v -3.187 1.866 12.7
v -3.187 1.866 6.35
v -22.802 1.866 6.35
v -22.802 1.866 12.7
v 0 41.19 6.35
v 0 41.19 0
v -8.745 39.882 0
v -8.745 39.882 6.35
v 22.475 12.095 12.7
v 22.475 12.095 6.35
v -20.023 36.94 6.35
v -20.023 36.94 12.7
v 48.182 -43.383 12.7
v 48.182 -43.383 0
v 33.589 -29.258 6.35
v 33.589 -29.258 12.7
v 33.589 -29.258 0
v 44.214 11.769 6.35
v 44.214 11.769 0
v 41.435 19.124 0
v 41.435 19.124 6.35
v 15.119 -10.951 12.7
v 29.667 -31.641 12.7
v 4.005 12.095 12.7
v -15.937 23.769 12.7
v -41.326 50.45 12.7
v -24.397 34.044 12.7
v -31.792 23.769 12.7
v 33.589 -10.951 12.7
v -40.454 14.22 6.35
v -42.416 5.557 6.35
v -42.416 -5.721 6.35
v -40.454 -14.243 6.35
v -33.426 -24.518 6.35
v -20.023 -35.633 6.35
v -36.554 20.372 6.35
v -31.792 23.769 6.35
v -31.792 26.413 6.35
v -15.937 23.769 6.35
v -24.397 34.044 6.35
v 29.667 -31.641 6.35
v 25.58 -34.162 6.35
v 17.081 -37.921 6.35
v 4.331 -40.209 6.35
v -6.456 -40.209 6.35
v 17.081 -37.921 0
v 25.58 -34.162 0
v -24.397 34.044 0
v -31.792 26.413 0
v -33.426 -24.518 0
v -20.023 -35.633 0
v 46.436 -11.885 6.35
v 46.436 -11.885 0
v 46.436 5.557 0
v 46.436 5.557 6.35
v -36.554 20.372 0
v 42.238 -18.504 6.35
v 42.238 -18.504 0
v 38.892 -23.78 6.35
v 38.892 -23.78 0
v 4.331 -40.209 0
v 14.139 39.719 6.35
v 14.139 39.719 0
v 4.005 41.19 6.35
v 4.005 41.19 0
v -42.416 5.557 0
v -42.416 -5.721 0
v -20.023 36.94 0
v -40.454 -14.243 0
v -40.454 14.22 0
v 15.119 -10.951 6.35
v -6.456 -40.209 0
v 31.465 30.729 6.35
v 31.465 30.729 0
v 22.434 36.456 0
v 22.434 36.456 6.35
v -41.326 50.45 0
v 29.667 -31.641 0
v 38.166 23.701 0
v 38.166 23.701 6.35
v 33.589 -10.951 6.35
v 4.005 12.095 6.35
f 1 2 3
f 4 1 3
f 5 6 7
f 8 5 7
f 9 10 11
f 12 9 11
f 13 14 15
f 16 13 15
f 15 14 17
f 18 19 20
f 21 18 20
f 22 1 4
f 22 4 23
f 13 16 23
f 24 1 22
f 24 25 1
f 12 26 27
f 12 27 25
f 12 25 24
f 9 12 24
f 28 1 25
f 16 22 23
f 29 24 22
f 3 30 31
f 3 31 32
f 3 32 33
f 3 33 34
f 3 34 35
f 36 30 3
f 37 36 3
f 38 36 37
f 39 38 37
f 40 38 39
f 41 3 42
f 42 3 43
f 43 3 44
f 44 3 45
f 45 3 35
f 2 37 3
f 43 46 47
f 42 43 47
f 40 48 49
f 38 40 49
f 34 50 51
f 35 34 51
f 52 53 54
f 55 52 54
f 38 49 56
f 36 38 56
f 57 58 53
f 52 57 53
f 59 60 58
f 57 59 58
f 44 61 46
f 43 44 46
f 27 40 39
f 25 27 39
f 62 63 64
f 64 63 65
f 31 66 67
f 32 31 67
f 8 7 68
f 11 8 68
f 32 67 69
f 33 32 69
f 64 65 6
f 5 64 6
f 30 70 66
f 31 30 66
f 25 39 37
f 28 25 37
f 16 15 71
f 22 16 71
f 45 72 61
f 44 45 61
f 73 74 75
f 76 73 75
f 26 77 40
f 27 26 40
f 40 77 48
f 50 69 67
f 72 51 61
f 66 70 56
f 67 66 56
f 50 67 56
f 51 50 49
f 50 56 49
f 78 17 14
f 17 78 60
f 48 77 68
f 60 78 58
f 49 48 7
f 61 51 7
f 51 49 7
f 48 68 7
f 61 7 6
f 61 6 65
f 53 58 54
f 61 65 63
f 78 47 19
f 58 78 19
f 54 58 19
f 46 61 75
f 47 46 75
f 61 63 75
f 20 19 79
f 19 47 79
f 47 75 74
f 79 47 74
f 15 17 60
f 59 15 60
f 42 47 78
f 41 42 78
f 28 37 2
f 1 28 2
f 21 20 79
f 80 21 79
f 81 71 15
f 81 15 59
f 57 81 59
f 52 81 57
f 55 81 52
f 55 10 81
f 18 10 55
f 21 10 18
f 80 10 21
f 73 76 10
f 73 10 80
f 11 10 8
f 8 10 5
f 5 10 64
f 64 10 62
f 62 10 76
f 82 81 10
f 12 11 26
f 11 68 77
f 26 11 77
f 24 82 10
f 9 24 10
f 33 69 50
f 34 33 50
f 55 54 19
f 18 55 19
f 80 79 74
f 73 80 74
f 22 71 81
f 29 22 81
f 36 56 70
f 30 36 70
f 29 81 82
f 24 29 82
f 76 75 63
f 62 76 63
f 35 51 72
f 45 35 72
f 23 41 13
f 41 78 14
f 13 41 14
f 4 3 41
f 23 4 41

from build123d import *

# Parameters (mm, degrees)
F1_DEPTH = 12.7
F2_DEPTH = 6.35


with BuildPart() as f1:
    # F0 (on Top) → F1 (new body)
    with BuildSketch(Plane.XY):
        Polygon((22.474717, 12.095485), (-20.022932, 36.940265), (-41.326346, 50.449748), (-24.396872, 34.043866), (-15.936619, 23.769072), (-31.791512, 23.769072), (-3.187324, 1.866438), (-22.801625, 1.866438), (29.666629, -31.641328), (48.181905, -43.382723), (33.589493, -29.257998), (15.119358, -10.951318), (33.589493, -10.951318), (4.004587, 12.095485), align=None)
    extrude(amount=F1_DEPTH)

    # F0 (on Top) → F2 (join)
    with BuildSketch(Plane.XY):
        Polygon((4.004587, 41.190032), (0, 41.190032), (-8.744708, 39.88241), (-20.022932, 36.940265), (22.474717, 12.095485), (4.004587, 12.095485), (33.589493, -10.951318), (15.119358, -10.951318), (33.589493, -29.257998), (38.892256, -23.779654), (42.238043, -18.503606), (46.43552, -11.884507), (46.43552, -3.675631), (46.43552, 5.557385), (44.213898, 11.76858), (41.435212, 19.123944), (38.166158, 23.700614), (31.46461, 30.72907), (22.434429, 36.455527), (14.13864, 39.718959), align=None)
        Polygon((22.474717, 12.095485), (-20.022932, 36.940265), (-41.326346, 50.449748), (-24.396872, 34.043866), (-15.936619, 23.769072), (-31.791512, 23.769072), (-3.187324, 1.866438), (-22.801625, 1.866438), (29.666629, -31.641328), (48.181905, -43.382723), (33.589493, -29.257998), (15.119358, -10.951318), (33.589493, -10.951318), (4.004587, 12.095485), align=None)
        Polygon((-15.936619, 23.769072), (-24.396872, 34.043866), (-31.791512, 26.413227), (-36.553774, 20.371506), (-40.454496, 14.220368), (-42.415924, 5.557385), (-42.415924, -5.720838), (-40.454496, -14.242595), (-33.426039, -24.517875), (-20.022932, -35.632648), (-6.456373, -40.209316), (4.331491, -40.209316), (17.080786, -37.920982), (25.580317, -34.161571), (29.666629, -31.641328), (-22.801625, 1.866438), (-3.187324, 1.866438), (-31.791512, 23.769072), align=None)
    extrude(amount=F2_DEPTH)


solid = f1.part
